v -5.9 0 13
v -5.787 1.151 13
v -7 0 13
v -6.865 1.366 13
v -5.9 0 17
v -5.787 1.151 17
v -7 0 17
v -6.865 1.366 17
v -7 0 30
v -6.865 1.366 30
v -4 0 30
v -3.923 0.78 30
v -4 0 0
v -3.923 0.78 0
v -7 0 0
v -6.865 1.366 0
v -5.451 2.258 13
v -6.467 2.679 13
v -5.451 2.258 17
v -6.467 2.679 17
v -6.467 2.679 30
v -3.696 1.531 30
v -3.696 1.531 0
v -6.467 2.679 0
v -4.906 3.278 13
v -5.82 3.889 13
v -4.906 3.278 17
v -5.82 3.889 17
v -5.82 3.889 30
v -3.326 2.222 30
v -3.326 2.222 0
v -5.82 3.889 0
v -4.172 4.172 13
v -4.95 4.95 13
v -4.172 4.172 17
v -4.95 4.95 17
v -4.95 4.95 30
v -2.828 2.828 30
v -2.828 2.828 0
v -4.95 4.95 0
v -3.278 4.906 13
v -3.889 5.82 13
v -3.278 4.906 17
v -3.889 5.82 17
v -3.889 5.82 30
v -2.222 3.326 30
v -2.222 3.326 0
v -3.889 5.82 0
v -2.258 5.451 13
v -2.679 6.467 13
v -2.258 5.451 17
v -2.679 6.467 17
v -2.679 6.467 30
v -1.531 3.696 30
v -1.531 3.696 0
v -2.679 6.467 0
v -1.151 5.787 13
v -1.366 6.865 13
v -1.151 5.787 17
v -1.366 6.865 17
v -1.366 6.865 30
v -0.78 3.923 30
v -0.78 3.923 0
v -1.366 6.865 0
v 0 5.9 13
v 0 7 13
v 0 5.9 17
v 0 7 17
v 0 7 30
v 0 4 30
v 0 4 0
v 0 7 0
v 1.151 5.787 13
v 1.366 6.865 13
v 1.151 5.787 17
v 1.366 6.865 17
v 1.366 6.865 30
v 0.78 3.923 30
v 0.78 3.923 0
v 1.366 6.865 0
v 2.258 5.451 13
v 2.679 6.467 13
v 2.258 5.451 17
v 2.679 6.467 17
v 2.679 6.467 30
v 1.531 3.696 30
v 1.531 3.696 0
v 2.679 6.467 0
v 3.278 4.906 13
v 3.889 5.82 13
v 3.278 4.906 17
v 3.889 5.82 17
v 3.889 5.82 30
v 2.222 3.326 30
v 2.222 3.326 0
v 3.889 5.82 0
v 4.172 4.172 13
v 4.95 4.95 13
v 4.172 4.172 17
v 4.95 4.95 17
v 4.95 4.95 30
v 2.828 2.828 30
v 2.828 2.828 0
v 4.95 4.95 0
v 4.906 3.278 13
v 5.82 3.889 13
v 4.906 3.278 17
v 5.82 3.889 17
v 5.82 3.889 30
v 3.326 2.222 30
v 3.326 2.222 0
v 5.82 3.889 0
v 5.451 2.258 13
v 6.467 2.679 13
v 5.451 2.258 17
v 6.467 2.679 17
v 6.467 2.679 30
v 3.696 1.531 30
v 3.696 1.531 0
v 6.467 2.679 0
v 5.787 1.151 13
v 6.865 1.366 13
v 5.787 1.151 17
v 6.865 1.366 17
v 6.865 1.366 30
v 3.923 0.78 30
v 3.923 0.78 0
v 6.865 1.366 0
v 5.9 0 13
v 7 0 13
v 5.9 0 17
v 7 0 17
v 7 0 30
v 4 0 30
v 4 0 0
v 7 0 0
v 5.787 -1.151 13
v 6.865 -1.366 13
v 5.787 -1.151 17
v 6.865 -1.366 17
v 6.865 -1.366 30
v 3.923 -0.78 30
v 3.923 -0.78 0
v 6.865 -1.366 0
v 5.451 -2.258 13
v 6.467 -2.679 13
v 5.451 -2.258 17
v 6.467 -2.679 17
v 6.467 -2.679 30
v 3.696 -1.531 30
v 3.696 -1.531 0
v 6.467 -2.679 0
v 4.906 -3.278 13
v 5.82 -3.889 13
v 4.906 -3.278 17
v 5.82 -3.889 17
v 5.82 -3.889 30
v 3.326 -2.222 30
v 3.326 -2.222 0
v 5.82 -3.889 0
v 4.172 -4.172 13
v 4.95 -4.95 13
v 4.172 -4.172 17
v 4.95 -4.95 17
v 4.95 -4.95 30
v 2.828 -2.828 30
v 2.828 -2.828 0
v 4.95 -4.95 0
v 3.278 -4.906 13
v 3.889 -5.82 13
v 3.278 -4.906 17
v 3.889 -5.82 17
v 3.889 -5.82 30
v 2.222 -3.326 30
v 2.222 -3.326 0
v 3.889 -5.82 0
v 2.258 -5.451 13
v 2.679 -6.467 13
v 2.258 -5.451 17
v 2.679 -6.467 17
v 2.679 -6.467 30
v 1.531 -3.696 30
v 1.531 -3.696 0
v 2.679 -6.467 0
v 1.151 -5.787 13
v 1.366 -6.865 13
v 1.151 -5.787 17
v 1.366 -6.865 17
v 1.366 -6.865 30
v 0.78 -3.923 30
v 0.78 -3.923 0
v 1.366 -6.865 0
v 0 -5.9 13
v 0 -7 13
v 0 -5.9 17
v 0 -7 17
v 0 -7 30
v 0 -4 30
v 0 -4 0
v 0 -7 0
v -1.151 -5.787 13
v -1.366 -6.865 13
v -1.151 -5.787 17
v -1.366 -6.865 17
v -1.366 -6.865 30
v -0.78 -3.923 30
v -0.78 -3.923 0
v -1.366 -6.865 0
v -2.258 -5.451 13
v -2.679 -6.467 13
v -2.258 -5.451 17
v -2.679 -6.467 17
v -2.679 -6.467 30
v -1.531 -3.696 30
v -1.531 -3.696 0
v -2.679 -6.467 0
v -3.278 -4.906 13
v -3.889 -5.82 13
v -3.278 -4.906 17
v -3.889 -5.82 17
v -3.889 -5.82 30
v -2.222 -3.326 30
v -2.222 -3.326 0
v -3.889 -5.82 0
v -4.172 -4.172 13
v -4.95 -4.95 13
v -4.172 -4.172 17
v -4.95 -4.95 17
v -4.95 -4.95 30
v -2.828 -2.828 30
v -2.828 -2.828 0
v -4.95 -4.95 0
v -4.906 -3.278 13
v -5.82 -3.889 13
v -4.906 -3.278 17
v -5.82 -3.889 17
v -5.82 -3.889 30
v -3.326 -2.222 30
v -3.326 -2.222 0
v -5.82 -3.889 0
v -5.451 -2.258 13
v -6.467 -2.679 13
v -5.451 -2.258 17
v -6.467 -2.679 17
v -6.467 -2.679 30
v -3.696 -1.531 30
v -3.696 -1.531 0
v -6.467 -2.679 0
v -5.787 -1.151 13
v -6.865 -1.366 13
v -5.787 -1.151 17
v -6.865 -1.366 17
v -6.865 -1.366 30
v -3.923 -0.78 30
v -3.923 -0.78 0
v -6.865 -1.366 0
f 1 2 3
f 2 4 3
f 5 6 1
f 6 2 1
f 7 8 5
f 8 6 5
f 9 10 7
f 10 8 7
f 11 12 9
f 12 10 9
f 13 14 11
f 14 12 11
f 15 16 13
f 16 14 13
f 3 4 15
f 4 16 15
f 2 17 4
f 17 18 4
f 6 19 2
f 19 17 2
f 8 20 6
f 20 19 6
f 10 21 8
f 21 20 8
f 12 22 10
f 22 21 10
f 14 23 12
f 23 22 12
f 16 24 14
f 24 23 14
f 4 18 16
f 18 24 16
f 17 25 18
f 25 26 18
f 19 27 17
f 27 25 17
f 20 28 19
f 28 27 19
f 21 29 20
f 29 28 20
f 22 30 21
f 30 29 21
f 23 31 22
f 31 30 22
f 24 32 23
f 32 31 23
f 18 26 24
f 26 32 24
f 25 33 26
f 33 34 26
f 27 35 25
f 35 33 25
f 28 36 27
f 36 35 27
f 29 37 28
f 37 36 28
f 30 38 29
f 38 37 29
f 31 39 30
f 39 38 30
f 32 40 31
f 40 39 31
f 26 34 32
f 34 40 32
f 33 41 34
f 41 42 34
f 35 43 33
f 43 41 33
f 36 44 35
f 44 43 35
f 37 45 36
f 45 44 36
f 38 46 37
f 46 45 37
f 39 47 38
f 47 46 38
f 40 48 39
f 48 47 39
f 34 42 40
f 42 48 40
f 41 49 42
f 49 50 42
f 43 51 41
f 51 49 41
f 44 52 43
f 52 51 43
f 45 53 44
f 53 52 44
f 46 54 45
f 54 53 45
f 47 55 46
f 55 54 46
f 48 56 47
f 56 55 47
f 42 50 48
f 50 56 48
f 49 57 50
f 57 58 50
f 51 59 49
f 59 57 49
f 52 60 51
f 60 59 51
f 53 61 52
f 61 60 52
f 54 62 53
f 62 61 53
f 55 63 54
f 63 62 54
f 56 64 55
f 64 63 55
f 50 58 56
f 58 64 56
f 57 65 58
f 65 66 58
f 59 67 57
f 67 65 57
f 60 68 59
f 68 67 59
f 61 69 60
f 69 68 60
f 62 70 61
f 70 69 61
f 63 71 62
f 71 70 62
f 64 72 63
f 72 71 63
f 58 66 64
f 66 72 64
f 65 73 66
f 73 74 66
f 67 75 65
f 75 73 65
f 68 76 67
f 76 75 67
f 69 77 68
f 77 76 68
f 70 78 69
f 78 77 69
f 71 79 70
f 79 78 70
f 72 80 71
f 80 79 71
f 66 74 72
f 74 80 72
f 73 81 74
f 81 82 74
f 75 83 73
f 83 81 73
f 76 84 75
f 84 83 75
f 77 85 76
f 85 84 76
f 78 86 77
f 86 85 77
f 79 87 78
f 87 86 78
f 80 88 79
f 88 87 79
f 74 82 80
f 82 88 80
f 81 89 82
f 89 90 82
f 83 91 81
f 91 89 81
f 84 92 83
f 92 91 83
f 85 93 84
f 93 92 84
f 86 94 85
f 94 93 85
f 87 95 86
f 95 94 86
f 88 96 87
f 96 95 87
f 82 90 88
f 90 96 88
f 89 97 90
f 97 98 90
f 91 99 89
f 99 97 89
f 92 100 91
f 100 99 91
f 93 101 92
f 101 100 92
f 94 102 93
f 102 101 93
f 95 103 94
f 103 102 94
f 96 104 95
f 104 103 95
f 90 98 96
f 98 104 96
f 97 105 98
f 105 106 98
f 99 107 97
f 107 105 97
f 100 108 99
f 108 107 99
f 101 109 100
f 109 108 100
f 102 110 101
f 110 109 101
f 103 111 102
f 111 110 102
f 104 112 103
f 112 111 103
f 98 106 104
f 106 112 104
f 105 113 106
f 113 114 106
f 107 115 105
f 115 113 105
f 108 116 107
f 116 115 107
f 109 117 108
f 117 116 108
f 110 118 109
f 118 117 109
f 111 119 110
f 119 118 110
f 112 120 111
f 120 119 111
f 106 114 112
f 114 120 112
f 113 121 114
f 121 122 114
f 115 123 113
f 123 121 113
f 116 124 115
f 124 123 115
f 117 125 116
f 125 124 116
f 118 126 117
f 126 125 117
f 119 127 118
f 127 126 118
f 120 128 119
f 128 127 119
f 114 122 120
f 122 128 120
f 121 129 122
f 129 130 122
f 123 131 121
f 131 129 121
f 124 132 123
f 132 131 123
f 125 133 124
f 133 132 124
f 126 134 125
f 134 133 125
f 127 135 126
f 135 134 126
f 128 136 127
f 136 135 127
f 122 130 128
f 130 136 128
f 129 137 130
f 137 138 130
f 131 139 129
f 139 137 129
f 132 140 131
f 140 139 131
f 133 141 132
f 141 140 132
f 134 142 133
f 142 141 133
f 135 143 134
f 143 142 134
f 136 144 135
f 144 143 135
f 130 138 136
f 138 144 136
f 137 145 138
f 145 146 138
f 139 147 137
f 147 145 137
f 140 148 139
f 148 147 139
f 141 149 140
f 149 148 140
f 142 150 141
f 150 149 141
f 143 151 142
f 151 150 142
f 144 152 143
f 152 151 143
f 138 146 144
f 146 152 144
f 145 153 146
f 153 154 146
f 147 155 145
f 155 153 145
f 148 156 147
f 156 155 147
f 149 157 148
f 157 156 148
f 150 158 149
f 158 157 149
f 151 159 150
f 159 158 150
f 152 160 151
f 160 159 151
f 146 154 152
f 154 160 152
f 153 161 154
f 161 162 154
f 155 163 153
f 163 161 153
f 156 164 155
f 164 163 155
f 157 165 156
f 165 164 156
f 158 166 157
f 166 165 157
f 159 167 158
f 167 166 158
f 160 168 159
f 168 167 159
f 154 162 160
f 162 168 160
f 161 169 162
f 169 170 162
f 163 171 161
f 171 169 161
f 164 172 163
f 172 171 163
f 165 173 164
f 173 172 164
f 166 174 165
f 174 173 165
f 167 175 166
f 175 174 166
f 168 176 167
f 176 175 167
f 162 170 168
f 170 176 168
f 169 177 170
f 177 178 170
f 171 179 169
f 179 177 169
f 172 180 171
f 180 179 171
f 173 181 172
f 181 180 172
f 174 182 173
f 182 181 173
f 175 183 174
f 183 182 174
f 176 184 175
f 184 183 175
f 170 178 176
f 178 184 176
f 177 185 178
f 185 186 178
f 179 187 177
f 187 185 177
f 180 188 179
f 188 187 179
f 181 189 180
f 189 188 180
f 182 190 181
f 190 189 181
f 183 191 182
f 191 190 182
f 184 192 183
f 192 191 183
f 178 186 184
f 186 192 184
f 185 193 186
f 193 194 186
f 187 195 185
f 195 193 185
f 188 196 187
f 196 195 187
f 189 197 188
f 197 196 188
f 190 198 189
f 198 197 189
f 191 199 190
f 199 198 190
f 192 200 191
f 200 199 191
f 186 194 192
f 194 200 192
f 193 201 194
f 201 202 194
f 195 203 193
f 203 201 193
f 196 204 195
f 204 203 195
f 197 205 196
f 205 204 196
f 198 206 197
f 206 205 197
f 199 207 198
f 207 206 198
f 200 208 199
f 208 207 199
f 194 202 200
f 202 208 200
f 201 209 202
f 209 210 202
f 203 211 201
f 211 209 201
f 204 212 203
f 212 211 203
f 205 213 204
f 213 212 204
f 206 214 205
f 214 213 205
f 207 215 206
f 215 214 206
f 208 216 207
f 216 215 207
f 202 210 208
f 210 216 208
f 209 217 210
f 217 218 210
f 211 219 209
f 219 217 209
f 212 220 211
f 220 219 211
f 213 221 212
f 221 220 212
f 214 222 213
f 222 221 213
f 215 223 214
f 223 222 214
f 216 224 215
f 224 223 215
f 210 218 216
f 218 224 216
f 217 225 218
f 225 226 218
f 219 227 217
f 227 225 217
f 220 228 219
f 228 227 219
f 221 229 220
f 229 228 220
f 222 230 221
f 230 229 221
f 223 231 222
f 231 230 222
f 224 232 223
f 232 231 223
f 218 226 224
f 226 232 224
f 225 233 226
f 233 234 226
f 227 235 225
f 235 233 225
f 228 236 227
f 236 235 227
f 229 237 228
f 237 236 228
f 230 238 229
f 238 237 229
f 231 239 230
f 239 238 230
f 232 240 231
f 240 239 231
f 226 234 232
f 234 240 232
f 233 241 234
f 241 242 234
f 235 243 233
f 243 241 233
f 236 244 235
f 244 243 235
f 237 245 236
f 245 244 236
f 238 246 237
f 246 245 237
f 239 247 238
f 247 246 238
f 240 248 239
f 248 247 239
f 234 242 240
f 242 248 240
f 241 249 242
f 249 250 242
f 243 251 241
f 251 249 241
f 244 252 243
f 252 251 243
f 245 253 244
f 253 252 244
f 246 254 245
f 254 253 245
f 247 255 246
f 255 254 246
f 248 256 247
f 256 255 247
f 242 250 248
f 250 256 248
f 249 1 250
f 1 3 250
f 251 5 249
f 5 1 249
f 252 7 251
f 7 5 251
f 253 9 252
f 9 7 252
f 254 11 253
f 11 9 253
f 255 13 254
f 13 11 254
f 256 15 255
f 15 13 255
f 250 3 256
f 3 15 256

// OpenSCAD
$fn = 32;

// ----------------------------------------------------------------------
// Grooved revolve: plain_grooves, bore R4
// ----------------------------------------------------------------------

// --- parameters (mm) ---
bore_r = 4;               // bore radius
outer_r = 7;              // outer radius of the body
total_h = 30;             // overall height, Z
wall = 3;                 // radial wall thickness
groove_w = 4;             // groove width
groove_d = 1.1;           // groove depth
grooves = 1;              // number of outer grooves

bbox_x = 2 * outer_r;  // full diameter
bore_d = 2 * bore_r;  // bore diameter
body_d = 2 * outer_r;  // body diameter
revolve_angle = 360;  // full turn around the Z axis

profile = [[4, 0], [7, 0], [7, 13], [5.9, 13], [5.9, 17], [7, 17], [7, 30], [4, 30]];  // primary outline, 8 points, counter clockwise

// --- the one profile operation ---
rotate_extrude(angle = revolve_angle) polygon(points = profile);
